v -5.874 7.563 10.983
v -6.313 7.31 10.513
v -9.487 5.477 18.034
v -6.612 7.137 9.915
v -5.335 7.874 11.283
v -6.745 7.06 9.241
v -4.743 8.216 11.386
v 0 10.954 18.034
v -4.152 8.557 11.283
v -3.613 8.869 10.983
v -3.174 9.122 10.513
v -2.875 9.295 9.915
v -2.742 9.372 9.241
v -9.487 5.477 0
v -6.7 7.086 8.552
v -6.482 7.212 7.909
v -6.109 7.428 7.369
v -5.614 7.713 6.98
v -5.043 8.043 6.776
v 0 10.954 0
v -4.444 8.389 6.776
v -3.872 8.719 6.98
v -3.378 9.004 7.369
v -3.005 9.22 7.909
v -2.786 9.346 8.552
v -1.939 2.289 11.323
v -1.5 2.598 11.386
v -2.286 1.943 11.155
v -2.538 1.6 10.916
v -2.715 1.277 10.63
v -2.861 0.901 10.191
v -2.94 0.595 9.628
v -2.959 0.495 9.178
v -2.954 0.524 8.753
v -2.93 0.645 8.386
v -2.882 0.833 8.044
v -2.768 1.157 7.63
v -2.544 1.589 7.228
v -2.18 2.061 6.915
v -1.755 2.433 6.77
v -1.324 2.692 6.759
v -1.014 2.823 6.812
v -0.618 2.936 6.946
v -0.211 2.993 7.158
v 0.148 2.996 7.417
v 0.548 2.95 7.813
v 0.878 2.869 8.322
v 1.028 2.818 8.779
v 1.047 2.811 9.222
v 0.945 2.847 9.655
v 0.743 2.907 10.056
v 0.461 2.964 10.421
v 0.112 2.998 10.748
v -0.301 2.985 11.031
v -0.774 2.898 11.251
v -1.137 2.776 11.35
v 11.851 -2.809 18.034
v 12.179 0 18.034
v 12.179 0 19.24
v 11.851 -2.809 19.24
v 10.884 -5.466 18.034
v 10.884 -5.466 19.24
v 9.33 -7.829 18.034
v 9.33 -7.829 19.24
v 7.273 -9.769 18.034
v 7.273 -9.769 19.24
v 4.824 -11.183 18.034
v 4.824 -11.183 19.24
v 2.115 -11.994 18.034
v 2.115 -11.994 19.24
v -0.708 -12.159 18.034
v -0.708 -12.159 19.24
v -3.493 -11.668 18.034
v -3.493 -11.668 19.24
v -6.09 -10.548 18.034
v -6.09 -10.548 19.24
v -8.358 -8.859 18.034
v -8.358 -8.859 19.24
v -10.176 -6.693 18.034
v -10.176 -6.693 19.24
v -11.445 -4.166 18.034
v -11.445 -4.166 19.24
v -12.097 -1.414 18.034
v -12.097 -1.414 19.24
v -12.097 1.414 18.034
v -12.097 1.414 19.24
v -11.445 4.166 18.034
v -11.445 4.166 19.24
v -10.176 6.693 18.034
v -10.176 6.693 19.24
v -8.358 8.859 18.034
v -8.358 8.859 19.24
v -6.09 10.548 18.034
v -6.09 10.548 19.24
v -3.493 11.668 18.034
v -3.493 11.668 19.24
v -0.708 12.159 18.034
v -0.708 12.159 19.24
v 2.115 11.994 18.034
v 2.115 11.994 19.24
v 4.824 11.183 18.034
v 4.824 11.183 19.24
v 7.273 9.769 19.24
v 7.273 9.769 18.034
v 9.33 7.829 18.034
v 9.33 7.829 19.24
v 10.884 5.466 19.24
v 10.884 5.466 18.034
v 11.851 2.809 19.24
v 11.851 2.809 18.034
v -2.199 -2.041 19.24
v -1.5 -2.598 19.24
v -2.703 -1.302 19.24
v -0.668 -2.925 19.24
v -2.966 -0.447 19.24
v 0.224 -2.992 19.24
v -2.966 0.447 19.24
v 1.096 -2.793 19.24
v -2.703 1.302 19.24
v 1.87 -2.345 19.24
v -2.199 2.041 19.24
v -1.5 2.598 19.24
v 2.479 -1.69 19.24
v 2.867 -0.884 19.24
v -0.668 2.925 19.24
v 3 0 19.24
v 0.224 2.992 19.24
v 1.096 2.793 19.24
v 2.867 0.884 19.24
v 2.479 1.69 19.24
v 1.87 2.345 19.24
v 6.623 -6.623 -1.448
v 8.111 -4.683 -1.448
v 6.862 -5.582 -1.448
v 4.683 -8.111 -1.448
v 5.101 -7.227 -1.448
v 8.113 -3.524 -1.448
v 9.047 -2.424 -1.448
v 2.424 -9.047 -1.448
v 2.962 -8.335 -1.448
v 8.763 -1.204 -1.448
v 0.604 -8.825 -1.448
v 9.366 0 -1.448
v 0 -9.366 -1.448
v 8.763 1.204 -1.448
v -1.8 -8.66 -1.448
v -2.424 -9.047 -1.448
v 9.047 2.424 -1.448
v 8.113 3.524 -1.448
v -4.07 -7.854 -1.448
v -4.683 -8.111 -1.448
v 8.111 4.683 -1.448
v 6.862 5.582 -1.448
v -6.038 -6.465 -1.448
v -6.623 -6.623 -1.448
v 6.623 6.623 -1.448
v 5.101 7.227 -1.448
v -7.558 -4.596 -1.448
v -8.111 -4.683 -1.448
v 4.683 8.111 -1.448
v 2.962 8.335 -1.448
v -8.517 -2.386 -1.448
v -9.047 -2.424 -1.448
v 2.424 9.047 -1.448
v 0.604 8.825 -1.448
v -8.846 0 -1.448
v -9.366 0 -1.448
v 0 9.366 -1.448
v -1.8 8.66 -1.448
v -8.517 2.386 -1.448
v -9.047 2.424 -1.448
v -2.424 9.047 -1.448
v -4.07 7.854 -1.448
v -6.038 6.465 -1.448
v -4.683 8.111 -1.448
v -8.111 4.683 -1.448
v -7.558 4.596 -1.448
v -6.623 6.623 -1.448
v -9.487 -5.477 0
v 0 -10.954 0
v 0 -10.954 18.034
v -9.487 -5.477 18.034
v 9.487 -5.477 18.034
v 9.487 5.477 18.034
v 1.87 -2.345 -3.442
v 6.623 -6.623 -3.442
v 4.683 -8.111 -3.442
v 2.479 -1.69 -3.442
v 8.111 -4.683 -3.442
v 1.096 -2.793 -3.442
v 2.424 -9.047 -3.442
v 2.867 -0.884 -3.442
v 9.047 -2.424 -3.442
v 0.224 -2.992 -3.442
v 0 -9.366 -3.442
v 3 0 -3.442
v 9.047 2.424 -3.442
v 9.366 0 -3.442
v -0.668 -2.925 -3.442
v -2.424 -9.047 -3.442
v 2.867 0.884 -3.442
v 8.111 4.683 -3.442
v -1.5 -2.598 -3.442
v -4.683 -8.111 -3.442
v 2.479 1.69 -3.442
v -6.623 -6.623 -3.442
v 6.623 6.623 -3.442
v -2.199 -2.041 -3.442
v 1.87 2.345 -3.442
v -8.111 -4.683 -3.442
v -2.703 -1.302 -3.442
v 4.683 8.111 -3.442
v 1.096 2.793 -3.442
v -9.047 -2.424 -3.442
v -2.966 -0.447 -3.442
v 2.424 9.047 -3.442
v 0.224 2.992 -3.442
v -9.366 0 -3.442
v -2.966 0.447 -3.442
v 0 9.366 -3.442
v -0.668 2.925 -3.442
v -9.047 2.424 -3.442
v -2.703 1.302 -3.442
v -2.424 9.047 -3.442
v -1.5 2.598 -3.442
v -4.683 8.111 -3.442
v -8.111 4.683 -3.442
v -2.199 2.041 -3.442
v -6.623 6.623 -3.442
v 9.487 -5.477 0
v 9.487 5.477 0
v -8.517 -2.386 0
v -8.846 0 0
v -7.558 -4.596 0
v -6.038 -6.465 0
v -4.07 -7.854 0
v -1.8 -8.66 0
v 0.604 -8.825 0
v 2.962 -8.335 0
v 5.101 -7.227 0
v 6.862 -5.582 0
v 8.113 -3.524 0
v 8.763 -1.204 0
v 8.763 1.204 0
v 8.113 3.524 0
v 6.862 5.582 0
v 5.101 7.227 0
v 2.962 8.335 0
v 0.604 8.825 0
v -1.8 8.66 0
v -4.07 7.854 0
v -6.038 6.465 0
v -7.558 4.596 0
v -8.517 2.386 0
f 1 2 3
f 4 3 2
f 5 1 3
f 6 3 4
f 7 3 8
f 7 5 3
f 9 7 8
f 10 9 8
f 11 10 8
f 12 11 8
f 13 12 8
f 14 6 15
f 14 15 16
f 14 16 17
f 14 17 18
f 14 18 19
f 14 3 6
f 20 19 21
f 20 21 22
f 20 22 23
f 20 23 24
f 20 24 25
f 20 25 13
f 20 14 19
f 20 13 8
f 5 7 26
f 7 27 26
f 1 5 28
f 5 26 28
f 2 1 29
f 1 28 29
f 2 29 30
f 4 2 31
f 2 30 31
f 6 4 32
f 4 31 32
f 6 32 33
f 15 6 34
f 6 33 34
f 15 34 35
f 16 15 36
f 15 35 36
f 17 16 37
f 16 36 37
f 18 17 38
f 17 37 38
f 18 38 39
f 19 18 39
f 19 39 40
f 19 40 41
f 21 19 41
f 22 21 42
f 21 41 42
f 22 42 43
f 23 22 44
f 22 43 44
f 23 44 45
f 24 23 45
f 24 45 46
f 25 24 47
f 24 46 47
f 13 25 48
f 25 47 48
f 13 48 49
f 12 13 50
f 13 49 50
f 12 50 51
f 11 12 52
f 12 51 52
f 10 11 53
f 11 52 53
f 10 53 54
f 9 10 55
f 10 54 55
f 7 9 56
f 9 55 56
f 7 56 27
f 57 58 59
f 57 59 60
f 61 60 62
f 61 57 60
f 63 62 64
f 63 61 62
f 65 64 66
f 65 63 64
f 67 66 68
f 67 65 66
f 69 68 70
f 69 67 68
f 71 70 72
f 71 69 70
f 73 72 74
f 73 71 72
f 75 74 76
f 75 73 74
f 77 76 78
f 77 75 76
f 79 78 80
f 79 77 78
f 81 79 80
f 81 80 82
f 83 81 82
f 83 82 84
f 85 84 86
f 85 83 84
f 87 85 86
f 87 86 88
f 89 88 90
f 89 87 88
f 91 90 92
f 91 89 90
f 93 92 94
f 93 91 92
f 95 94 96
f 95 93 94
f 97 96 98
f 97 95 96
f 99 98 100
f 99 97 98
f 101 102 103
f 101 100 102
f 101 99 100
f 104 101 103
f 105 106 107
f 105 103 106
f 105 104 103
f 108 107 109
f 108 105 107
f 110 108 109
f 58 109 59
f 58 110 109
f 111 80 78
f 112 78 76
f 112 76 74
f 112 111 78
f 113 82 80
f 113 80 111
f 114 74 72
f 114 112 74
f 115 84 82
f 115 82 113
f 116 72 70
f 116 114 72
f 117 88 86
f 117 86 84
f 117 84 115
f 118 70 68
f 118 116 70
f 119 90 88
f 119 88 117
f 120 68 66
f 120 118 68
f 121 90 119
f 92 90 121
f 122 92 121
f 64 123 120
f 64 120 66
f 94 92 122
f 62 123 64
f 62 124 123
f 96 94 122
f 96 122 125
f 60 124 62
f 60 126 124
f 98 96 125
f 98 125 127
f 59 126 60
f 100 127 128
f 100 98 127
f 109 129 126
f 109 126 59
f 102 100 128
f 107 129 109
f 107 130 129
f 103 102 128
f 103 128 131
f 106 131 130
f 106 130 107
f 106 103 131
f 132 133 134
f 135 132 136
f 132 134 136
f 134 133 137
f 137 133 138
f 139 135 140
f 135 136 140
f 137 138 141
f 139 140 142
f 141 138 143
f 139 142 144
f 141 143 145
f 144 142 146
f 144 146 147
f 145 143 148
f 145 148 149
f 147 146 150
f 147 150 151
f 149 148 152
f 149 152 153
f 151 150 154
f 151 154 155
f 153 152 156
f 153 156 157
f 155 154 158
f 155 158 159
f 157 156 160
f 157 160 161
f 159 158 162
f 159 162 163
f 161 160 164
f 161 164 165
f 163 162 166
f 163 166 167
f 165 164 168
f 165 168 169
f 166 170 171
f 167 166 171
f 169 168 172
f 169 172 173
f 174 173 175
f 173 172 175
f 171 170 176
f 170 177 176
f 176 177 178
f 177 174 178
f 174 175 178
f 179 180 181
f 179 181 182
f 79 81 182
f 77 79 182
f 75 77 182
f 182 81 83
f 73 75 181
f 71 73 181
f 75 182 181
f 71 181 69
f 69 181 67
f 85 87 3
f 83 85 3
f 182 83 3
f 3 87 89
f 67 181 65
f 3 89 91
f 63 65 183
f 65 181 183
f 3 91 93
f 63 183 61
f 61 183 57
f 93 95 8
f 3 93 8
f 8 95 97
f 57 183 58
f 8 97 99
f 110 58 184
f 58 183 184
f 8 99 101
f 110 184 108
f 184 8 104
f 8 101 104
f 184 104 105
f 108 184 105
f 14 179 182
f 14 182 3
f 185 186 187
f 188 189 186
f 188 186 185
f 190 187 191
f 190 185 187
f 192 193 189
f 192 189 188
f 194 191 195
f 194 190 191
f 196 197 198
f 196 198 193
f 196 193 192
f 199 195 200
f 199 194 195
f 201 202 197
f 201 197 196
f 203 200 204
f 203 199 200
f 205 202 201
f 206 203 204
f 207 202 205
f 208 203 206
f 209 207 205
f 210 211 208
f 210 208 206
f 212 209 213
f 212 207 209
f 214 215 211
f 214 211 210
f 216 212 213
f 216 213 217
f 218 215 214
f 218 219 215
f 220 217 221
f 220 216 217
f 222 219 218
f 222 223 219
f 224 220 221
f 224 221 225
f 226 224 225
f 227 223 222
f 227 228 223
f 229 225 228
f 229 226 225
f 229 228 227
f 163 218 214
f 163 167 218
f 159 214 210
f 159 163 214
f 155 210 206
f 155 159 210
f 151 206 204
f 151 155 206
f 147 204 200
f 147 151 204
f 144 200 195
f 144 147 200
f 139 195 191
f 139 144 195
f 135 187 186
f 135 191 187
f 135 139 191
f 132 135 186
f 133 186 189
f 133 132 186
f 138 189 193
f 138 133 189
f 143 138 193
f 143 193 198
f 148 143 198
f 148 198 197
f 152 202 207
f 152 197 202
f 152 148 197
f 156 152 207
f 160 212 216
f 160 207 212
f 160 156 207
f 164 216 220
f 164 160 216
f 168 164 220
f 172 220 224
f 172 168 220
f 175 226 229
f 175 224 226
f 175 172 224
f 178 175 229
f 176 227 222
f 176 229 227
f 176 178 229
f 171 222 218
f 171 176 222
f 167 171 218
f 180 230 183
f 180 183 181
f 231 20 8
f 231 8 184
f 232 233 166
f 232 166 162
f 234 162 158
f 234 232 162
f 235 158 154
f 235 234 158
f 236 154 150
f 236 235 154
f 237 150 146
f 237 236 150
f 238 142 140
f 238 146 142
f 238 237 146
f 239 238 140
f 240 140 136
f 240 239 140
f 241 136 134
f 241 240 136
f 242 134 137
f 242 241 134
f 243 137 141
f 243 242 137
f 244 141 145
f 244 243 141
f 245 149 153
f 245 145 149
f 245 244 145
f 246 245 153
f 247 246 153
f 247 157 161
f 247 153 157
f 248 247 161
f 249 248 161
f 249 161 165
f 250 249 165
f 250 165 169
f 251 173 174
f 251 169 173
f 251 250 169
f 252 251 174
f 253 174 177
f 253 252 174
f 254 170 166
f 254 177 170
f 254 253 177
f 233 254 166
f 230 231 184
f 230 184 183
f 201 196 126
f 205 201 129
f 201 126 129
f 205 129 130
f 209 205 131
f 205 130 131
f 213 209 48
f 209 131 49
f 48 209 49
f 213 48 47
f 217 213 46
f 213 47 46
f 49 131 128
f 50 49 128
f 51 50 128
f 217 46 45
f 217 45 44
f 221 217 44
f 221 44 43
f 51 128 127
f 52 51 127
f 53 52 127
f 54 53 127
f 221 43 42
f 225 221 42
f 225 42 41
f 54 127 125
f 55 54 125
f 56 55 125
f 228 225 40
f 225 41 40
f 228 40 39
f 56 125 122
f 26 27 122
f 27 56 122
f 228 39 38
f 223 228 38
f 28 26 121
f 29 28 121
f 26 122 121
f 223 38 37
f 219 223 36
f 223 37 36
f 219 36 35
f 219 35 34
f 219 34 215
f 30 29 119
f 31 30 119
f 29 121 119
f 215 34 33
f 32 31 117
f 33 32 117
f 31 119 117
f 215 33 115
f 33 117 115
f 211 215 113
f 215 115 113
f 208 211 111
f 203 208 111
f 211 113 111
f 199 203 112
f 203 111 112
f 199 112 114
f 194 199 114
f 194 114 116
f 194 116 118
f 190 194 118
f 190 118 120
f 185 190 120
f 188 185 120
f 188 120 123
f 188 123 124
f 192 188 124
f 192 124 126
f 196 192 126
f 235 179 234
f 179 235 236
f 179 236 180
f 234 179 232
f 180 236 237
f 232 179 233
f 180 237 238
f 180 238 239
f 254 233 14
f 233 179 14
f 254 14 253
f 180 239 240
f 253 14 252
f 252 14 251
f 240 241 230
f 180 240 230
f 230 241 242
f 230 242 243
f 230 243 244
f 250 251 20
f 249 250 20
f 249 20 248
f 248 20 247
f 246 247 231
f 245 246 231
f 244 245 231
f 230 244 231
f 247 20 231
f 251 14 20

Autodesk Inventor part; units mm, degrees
ref_plane "YZ Plane" through (0, 0, 0) normal (1, 0, 0) x (0, 1, 0)
ref_plane "XZ Plane" through (0, 0, 0) normal (0, 1, 0) x (-1, 0, 0)
ref_plane "XY Plane" through (0, 0, 0) normal (0, 0, 1) x (1, 0, 0)
sketch "Sketch1" plane through (0, 0, 0) normal (0, 0, 1) x (1, 0, 0)
  line L0 (-9.4869, 5.4773) -> (0, 10.9545)
  line L1 (0, 10.9545) -> (9.4869, 5.4773)
  line L2 (9.4869, 5.4773) -> (9.4869, -5.4773)
  line L3 (9.4869, -5.4773) -> (0, -10.9545)
  line L4 (0, -10.9545) -> (-9.4869, -5.4773)
  line L5 (-9.4869, -5.4773) -> (-9.4869, 5.4773)
  point P0 (0, 0)
  point P1 (0, 0)
  dimension "d0" = 18.9738
extrude "Extrusion1" add sketch "Sketch1" along normal blind 18.034
sketch "Sketch2" plane through (0, 0, 18.034) normal (0, 0, 1) x (1, 0, 0)
  circle A0 centre (0, 0) radius 12.1793
  dimension "d3" = 24.3586
extrude "Extrusion2" add sketch "Sketch2" along normal blind 1.2065
sketch "Sketch3" plane through (0, 0, 0) normal (0, 0, -1) x (-1, 0, 0)
  circle A0 centre (0, 0) radius 8.8455
  dimension "d6" = 17.6911
extrude "Extrusion3" add sketch "Sketch3" along normal blind 1.4478
sketch "Sketch4" plane through (0, 0, -1.4478) normal (0, 0, -1) x (-1, 0, 0)
  circle A0 centre (0, 0) radius 9.3663
  dimension "d9" = 18.7325
extrude "Extrusion4" add sketch "Sketch4" along normal blind 1.9939
sketch "Sketch5" plane through (0, 0, 19.2405) normal (0, 0, 1) x (1, 0, 0)
  circle A0 centre (0, 0) radius 3
  dimension "d12" = 6
extrude "Extrusion5" cut sketch "Sketch5" against normal through all
sketch "Sketch6" plane through (0, 10.9545, 18.034) normal (-0.5, 0.8660254, 0) x (0.8660254, 0.5, 0)
  line L0 (-10.9545, 0) -> (0, 0) projected
  line L1 (-10.9545, 18.034) -> (0, 18.034) projected
  circle A0 centre (-5.4773, 8.9662) radius 1.6336
  line L2 (-5.4773, 18.034) -> (-5.4773, 0)
  dimension "d16" = 9.0678
hole "Hole1" at (-4.7434, 8.2159, 9.0678) direction (0.5, -0.8660254, 0) diameter 4.6355 depth 8.89
thread "Thread1" size "10-24 UNC" class "2B" standard "ANSI Unified Screw Threads" full length
properties part number "T80H-SM61" material "Aluminum-6061"
